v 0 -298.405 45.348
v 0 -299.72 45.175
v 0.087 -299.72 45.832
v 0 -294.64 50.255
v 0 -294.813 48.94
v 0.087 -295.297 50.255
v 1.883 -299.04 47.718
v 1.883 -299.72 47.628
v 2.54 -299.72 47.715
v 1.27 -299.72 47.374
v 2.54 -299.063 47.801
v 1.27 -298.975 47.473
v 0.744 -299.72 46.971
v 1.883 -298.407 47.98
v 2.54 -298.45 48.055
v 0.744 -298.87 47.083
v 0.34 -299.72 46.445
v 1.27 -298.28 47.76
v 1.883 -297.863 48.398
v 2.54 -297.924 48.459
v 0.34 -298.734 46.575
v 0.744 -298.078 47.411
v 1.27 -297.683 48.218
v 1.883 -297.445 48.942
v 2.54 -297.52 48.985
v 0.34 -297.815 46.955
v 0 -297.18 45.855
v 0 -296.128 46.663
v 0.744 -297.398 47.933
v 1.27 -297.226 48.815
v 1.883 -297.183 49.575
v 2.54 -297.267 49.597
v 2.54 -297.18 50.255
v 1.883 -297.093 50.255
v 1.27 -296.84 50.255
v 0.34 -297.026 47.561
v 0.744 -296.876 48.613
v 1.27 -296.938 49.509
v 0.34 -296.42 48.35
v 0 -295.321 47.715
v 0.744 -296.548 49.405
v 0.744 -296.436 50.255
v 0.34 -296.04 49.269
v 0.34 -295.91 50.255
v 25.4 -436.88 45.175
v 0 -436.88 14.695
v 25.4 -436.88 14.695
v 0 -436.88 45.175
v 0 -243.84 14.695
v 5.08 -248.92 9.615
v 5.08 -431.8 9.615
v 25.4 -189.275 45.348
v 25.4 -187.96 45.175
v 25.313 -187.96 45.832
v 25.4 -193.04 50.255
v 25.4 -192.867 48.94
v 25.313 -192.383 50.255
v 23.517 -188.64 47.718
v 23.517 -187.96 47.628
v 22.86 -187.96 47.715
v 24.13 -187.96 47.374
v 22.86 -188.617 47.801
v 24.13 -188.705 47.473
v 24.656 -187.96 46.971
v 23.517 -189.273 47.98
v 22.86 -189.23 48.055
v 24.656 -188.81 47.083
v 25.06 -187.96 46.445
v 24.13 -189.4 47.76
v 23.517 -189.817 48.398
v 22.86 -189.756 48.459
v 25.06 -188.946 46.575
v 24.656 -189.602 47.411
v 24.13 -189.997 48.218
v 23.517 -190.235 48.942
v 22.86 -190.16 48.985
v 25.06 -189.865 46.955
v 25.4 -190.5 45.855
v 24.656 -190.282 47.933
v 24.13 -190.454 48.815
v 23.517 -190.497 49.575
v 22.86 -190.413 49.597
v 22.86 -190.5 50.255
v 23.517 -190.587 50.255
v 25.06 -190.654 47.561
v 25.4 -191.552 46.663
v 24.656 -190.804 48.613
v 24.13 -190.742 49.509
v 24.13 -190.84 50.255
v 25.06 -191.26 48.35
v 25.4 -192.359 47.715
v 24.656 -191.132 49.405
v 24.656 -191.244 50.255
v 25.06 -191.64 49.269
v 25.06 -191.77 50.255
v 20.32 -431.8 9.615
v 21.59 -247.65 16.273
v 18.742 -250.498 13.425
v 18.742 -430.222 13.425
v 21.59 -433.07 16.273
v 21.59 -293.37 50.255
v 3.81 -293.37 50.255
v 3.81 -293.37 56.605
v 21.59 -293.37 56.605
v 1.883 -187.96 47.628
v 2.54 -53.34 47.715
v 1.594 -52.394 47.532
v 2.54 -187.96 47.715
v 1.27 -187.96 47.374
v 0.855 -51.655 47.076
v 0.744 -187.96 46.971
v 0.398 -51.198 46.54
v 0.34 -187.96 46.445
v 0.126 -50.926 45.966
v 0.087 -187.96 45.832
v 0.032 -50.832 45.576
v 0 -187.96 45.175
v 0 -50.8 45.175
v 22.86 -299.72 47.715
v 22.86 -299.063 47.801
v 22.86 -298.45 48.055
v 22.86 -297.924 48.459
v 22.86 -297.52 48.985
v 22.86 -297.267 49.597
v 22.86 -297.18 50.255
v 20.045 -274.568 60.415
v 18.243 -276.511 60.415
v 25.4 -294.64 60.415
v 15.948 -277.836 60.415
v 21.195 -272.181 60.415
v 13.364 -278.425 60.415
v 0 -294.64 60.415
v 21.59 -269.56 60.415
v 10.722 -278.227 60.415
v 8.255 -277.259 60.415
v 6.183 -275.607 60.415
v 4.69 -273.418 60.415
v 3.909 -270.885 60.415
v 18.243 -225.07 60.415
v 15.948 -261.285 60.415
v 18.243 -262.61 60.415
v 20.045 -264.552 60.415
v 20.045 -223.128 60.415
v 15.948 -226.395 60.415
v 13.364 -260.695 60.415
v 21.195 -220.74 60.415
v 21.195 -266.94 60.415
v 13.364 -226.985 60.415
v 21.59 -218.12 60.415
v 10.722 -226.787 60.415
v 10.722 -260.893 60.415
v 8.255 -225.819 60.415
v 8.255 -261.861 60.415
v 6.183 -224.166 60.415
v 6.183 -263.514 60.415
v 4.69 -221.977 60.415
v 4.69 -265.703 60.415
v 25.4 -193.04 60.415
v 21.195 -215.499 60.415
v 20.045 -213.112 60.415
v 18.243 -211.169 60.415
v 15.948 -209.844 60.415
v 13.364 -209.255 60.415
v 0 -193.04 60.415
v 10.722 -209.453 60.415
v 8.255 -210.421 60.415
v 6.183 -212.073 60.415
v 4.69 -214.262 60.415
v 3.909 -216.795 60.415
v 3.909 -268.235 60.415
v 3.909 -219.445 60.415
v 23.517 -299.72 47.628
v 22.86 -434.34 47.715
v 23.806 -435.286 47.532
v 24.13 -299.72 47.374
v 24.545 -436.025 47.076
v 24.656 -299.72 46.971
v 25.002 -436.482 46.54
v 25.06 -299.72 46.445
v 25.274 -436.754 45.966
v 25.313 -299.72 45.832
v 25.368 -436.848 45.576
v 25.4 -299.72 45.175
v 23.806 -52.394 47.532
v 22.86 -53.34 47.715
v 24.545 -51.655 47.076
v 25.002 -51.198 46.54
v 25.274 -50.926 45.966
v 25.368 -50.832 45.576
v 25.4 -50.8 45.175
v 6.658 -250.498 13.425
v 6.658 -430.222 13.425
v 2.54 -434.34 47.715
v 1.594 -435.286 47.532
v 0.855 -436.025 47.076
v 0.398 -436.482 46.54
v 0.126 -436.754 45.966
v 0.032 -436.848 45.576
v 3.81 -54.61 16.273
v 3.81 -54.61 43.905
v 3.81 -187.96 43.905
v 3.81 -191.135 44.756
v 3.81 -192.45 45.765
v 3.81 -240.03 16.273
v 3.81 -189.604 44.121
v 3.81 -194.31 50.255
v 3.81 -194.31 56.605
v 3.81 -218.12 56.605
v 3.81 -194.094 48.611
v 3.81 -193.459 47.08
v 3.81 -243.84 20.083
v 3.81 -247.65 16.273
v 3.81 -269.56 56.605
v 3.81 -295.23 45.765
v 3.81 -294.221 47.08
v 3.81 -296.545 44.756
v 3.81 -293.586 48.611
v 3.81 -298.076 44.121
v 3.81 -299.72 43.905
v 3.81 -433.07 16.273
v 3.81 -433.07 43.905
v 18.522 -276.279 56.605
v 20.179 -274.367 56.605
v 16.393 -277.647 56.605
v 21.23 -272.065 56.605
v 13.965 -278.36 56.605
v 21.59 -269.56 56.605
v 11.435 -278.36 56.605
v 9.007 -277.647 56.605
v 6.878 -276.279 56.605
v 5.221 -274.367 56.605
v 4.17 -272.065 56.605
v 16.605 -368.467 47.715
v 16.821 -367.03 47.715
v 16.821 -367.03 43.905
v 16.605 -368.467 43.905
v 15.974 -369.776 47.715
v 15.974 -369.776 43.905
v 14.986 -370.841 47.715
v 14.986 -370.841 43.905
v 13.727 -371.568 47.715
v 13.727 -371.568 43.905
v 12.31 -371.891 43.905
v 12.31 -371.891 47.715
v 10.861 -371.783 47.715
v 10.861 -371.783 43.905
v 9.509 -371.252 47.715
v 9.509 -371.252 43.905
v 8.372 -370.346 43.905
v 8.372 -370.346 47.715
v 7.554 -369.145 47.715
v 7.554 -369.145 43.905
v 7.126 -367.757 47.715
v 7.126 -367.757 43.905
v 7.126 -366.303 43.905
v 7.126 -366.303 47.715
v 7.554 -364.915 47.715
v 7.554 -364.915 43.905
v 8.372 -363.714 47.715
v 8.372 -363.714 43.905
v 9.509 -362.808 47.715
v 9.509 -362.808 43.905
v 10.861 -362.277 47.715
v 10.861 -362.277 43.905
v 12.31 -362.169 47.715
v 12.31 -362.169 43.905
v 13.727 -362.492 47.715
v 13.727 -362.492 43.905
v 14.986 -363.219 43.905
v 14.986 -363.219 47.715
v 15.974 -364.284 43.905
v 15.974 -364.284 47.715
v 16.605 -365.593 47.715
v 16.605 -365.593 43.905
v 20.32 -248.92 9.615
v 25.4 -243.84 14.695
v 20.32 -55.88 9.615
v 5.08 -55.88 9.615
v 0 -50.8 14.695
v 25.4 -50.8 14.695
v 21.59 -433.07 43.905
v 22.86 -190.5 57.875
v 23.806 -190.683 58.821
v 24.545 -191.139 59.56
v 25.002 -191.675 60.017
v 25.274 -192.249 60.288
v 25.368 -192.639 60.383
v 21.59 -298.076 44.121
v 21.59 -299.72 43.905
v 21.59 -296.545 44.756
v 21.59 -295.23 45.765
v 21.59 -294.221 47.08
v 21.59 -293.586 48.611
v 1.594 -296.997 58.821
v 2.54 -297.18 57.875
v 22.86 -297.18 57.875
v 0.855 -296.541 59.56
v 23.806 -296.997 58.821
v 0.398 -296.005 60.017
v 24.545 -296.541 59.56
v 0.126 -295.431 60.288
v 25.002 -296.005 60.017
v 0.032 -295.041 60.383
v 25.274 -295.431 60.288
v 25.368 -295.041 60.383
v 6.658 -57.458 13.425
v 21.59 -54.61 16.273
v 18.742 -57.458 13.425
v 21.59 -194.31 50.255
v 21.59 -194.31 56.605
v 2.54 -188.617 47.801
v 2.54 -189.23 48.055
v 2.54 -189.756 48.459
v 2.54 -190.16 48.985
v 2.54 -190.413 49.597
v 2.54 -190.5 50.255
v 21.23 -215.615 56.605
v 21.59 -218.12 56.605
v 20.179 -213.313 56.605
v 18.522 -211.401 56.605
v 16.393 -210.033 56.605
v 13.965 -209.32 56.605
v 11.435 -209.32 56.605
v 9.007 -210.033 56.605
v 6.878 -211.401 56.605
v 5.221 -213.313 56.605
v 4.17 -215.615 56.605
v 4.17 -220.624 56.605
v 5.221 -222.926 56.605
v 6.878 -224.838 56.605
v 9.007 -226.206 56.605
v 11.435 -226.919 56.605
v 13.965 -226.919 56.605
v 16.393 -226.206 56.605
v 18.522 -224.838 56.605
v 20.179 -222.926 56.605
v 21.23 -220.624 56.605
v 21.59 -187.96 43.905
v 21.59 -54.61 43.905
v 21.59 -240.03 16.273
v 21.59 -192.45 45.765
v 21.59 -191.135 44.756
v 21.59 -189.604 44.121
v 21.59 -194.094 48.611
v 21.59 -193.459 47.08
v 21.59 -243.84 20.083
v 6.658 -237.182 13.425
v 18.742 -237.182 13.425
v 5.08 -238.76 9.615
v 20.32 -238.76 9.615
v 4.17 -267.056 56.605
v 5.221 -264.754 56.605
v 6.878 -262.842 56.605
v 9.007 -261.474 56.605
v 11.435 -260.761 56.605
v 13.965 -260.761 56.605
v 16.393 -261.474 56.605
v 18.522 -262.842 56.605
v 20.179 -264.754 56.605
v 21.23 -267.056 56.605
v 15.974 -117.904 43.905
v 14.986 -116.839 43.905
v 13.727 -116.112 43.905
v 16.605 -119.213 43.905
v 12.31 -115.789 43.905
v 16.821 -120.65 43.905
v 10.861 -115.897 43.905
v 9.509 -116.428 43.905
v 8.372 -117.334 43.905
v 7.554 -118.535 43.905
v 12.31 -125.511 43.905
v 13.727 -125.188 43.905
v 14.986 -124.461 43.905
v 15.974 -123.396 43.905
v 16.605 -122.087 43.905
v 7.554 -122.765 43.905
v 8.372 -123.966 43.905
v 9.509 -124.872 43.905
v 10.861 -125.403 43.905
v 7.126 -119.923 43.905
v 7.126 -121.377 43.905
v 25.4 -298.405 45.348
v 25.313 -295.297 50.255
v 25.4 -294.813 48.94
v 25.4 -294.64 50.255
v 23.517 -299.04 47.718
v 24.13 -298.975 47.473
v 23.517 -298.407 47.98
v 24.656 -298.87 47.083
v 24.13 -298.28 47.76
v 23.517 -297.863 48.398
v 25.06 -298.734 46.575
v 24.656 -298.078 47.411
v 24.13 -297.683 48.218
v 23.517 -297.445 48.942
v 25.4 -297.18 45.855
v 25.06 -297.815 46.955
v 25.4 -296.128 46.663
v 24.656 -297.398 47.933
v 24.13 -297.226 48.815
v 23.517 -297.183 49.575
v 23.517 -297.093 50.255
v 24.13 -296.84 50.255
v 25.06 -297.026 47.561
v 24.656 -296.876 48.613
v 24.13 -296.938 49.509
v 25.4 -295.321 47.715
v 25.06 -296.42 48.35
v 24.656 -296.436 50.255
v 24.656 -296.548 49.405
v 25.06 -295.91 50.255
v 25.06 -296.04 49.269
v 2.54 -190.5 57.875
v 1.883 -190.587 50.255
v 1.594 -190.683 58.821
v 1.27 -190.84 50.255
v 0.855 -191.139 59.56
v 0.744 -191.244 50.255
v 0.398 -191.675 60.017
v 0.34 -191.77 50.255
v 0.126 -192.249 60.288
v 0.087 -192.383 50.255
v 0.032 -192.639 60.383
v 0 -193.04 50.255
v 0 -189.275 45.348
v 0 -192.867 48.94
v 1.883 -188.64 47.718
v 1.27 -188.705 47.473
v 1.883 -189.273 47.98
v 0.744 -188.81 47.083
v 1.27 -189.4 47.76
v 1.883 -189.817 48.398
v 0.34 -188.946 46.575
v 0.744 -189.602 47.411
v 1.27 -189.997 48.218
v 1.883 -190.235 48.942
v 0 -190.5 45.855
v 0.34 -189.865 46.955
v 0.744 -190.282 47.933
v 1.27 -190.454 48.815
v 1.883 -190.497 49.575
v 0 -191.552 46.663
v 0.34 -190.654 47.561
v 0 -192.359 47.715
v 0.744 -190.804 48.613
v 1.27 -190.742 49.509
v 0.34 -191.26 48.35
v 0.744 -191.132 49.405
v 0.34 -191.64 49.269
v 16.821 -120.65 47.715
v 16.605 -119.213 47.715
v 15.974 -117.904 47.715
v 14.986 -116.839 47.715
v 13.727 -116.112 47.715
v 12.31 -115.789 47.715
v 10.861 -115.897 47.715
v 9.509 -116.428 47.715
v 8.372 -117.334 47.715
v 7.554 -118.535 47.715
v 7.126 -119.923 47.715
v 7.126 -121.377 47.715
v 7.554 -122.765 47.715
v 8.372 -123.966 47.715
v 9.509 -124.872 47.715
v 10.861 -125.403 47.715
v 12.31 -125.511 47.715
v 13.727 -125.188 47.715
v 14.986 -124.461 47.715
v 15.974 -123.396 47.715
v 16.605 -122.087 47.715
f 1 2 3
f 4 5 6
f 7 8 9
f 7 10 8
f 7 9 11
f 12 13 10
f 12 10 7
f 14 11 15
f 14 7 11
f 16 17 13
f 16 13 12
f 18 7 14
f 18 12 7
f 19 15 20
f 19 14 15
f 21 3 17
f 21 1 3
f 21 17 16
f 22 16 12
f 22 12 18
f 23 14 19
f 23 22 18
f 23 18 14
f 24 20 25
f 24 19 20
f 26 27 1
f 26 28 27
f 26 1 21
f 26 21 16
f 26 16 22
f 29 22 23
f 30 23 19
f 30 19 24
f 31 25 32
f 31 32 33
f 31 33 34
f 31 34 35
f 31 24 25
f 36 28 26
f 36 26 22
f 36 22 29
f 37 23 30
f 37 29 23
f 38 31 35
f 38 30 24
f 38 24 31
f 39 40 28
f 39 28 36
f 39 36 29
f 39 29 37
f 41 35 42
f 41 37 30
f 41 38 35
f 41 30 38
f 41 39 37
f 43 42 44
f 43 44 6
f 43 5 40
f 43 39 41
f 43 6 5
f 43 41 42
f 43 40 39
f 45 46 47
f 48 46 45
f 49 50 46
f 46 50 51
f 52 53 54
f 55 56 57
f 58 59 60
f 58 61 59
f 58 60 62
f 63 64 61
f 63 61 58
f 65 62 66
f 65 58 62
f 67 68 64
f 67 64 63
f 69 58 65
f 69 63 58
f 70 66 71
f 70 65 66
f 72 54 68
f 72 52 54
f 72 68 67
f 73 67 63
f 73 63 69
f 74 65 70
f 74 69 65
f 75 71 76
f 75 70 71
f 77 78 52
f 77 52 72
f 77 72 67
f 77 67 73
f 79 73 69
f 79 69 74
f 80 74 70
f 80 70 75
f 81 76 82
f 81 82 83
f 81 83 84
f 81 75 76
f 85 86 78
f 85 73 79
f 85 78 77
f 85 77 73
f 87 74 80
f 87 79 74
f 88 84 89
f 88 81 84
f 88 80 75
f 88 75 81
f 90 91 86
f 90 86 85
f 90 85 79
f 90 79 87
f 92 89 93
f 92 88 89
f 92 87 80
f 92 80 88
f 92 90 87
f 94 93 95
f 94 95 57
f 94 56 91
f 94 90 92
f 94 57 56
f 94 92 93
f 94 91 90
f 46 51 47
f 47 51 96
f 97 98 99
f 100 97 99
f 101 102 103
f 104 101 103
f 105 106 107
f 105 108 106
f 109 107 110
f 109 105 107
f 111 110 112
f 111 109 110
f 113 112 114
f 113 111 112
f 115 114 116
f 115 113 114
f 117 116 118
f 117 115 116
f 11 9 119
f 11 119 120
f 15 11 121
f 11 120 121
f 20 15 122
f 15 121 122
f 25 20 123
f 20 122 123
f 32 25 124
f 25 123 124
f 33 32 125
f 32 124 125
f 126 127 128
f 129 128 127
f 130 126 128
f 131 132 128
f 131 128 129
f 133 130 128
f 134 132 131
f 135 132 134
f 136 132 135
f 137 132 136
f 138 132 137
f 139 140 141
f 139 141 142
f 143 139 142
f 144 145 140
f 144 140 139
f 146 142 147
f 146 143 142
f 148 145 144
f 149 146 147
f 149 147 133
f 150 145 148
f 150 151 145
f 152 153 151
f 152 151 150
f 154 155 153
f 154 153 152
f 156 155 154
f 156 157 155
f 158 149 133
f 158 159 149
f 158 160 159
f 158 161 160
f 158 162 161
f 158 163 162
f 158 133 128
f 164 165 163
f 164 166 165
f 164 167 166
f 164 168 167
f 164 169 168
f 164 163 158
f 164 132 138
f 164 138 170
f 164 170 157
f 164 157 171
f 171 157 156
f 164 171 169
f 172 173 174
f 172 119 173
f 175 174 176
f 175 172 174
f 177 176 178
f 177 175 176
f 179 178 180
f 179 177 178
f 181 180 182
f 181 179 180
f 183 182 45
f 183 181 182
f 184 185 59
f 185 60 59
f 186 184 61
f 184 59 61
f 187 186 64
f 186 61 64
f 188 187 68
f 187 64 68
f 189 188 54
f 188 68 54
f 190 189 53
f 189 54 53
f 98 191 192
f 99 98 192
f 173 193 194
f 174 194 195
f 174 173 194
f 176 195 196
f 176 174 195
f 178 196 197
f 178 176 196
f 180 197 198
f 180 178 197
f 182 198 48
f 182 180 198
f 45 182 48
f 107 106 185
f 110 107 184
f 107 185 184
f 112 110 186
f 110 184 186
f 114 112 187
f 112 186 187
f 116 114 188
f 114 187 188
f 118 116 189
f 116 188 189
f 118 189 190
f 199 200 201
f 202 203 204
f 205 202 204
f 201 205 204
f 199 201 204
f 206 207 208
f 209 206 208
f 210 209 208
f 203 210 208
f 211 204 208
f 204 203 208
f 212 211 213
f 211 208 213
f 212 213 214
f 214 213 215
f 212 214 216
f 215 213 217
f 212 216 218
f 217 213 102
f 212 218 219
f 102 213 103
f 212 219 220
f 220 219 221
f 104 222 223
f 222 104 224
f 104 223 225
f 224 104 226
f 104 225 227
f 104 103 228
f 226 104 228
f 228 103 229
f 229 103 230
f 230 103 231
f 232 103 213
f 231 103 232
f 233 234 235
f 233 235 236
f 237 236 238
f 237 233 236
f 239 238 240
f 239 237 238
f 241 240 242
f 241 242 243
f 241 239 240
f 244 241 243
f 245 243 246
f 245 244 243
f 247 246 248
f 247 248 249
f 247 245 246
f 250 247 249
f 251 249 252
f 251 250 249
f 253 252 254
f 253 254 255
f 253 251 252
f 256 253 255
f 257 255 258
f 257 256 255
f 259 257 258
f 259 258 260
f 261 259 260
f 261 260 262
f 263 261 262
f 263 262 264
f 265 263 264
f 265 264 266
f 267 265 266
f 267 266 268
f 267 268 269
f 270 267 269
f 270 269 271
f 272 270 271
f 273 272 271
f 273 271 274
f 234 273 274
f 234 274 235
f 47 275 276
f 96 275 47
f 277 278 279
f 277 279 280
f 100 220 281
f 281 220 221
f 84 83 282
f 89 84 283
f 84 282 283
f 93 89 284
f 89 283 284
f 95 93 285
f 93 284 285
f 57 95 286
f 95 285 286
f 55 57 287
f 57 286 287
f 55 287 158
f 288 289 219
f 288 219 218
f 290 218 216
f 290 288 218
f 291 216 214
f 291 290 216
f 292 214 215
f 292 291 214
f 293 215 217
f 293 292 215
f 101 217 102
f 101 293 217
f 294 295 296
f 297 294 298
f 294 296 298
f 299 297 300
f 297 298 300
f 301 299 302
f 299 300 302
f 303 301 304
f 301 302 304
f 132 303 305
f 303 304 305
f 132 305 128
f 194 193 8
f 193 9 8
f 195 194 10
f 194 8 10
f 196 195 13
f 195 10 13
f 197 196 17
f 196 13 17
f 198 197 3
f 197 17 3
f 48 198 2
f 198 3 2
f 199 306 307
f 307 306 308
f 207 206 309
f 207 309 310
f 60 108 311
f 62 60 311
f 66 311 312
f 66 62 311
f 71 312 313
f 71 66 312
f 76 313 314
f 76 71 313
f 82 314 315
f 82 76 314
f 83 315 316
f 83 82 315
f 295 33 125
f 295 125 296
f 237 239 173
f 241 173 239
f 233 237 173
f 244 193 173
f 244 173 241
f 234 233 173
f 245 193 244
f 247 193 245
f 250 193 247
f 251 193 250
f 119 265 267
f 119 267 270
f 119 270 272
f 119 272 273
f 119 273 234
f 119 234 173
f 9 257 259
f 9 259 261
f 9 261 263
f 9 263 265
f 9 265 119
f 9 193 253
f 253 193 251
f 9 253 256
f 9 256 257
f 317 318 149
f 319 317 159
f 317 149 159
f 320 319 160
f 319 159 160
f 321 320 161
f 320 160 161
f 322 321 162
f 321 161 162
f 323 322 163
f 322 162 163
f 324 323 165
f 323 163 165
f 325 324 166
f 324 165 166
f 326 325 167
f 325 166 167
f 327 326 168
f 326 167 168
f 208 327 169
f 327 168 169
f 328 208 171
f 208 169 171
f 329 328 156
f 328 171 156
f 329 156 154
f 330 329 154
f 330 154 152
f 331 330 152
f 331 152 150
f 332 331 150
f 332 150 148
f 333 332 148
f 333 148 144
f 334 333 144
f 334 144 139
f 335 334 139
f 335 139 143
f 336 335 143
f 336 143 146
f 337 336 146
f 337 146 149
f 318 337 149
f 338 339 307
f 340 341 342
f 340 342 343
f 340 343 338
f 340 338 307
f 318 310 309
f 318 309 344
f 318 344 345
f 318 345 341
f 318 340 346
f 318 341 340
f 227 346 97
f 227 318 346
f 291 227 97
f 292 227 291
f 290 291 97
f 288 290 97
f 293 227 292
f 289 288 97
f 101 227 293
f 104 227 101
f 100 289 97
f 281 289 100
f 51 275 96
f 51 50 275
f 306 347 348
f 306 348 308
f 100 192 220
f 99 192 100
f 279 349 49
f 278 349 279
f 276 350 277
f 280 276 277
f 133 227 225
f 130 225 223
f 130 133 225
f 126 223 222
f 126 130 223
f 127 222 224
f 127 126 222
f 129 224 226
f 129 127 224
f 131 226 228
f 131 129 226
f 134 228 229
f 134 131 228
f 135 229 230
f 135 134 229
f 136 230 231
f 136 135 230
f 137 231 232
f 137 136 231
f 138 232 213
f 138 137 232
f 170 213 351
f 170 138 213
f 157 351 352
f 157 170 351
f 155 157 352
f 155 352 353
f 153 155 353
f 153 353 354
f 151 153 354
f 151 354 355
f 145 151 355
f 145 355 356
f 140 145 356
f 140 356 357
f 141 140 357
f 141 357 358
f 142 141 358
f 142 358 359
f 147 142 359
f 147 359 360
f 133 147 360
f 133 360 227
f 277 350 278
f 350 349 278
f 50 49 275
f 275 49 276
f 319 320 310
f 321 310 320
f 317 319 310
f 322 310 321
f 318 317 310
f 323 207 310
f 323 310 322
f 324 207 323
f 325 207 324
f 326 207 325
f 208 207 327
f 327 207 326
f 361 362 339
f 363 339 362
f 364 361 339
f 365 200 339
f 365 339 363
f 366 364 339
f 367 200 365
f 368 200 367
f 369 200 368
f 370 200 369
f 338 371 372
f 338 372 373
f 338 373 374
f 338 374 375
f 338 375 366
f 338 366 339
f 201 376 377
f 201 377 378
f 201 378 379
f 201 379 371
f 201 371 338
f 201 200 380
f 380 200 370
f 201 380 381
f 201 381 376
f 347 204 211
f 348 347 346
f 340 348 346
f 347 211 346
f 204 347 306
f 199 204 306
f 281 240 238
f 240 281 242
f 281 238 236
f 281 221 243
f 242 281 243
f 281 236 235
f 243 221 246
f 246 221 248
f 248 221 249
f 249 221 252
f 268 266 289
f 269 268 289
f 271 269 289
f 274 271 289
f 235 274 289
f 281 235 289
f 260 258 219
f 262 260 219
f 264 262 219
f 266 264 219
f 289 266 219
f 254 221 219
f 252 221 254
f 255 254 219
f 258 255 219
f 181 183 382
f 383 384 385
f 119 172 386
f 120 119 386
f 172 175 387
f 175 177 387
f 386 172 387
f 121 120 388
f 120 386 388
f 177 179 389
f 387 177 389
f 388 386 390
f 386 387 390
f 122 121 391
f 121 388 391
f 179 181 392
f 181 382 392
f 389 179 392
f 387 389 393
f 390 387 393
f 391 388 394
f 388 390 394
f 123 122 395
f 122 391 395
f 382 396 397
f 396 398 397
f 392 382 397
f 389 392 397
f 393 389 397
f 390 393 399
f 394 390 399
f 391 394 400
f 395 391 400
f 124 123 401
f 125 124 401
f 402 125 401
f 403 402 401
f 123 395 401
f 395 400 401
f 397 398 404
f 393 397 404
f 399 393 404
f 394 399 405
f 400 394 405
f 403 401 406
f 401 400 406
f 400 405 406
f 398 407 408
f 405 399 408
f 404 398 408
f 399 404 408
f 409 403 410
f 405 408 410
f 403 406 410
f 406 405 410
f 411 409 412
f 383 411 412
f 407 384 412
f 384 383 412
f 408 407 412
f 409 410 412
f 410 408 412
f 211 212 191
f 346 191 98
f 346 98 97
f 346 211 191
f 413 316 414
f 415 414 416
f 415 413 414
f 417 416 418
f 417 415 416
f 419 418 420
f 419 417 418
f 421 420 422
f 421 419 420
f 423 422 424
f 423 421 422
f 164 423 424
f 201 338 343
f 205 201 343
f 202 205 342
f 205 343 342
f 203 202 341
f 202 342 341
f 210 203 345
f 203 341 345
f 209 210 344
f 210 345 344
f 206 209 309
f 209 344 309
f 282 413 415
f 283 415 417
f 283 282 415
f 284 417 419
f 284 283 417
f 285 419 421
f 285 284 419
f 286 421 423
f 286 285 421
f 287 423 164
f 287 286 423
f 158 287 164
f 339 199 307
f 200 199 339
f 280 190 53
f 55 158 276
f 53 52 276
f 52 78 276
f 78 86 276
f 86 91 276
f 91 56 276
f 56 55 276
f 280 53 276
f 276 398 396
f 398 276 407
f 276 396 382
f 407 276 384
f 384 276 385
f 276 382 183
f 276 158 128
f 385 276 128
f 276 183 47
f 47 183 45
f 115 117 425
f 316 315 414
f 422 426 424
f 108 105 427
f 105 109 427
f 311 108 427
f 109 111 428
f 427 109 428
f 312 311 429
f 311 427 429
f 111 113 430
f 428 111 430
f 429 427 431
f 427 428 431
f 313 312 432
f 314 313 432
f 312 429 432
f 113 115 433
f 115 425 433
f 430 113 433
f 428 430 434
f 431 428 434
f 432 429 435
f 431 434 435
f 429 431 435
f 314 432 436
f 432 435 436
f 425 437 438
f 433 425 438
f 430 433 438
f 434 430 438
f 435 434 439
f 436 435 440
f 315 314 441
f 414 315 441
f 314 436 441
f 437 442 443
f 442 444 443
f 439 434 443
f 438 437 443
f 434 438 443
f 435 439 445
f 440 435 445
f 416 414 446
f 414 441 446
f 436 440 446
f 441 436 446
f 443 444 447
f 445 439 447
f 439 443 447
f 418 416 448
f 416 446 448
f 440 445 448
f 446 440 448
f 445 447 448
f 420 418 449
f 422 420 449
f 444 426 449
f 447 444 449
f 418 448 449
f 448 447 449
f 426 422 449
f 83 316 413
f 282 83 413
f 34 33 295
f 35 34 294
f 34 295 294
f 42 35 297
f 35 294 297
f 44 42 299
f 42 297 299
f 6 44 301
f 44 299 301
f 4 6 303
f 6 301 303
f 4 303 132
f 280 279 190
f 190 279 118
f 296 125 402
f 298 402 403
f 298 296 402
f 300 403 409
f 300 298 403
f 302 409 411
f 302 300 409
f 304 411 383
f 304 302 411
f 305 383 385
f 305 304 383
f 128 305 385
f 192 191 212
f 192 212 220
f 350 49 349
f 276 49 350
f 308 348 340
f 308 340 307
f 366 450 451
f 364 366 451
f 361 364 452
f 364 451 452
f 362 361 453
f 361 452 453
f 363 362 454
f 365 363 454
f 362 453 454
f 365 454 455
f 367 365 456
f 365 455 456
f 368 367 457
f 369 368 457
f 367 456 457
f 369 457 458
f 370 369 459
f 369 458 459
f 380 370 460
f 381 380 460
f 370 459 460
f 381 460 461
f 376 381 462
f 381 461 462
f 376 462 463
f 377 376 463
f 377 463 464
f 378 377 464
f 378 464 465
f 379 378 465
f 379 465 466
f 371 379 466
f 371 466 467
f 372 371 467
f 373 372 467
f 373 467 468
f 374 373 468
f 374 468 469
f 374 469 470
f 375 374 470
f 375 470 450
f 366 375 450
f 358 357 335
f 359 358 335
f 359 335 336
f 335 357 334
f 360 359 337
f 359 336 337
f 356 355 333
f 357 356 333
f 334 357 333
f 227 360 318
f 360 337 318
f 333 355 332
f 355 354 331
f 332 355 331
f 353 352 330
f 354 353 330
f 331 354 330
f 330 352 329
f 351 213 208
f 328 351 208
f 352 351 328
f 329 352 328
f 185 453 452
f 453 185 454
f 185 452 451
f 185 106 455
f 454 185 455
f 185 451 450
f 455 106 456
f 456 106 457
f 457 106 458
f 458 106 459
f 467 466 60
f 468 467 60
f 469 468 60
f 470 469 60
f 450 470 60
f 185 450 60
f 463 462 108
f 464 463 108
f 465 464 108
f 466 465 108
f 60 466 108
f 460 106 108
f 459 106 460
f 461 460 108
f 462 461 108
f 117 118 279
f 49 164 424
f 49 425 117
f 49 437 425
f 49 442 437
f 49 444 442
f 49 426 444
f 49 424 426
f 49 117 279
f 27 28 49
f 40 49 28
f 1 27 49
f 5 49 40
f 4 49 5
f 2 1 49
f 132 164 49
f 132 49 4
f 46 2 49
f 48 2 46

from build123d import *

# Parameters (mm, degrees)
F1_DEPTH       = 25.4
F2_F1_R        = 2.54
F2_F2_R        = 2.54
F3_SIZE        = 5.08
F4_T           = -3.81
F5_R           = 8.89
F6_DEPTH       = 3.81
F7_D           = 5.5
F7_DEPTH       = 12.7
F7_START       = 12.7
F7_CBORE_D     = 9.75
F7_CBORE_DEPTH = 5
F7_TIP         = 1.6523667023


with BuildPart() as f1:
    # F0 (on Right) → F1 (new body)
    with BuildSketch(Plane.YZ):
        Polygon((-190.5, 60.4147898585), (-243.84, 60.4147898585), (-243.84, 9.6147898585), (-50.8, 9.6147898585), (-50.8, 47.7147898585), (-190.5, 47.7147898585), align=None)
    extrude(amount=F1_DEPTH)

    # F2: fillet of radius 2.54 on 5 edges, made by hand

    # F2_f1
    f2_f1_edges = [f1.edges().sort_by_distance(p)[0] for p in [
        (12.7, -190.5, 47.7147898585),
    ]]
    fillet(f2_f1_edges, radius=F2_F1_R)

    # F2_f2
    f2_f2_edges = [f1.edges().sort_by_distance(p)[0] for p in [
        (25.4, -119.38, 47.7147898585),
        (0, -119.38, 47.7147898585),
        (12.7, -50.8, 47.7147898585),
        (12.7, -190.5, 60.4147898585),
        (0, -189.7560512242, 48.4587386342),
        (25.4, -189.7560512242, 48.4587386342),
    ]]
    fillet(f2_f2_edges, radius=F2_F2_R)

    # F3
    f3_edges = [f1.edges().sort_by_distance(p)[0] for p in [
        (25.4, -147.32, 9.61479),
        (12.7, -243.84, 9.61479),
        (12.7, -50.8, 9.61479),
        (0, -147.32, 9.61479),
    ]]
    chamfer(f3_edges, length=F3_SIZE)

    # F4
    f4_openings = [f1.faces().sort_by_distance(p)[0] for p in [
        (12.7, -243.84, 37.55479),
    ]]
    offset(amount=F4_T, openings=f4_openings)

    # F5 (on face) → F6 (cut, through all)
    with BuildSketch(Plane.XY.offset(60.4147898585)):
        with Locations((12.7, -218.1196852207)):
            Circle(F5_R)
    extrude(amount=-F6_DEPTH, mode=Mode.SUBTRACT)

    # F7
    # its depths count from where the whole tool has entered the part; down to there all is cleared
    with Locations(Plane.XY.offset(60.4147898585).offset(-F7_START)):
        with Locations((11.946093291, -120.65)):
            CounterBoreHole(F7_D / 2, F7_CBORE_D / 2, F7_CBORE_DEPTH, depth=F7_DEPTH)
            with Locations((0, 0, -(F7_DEPTH + F7_TIP / 2))):  # 118° drill point
                Cone(0, F7_D / 2, F7_TIP, mode=Mode.SUBTRACT)

    # F8: F1 across face


with BuildPart() as f1_1:
    add(f1.part)
    add(f1.part.mirror(Plane(origin=(12.7, -243.84, 36.5538832465), x_dir=(1, 0, 0), z_dir=(0, -1, 0))))


solid = f1_1.part
